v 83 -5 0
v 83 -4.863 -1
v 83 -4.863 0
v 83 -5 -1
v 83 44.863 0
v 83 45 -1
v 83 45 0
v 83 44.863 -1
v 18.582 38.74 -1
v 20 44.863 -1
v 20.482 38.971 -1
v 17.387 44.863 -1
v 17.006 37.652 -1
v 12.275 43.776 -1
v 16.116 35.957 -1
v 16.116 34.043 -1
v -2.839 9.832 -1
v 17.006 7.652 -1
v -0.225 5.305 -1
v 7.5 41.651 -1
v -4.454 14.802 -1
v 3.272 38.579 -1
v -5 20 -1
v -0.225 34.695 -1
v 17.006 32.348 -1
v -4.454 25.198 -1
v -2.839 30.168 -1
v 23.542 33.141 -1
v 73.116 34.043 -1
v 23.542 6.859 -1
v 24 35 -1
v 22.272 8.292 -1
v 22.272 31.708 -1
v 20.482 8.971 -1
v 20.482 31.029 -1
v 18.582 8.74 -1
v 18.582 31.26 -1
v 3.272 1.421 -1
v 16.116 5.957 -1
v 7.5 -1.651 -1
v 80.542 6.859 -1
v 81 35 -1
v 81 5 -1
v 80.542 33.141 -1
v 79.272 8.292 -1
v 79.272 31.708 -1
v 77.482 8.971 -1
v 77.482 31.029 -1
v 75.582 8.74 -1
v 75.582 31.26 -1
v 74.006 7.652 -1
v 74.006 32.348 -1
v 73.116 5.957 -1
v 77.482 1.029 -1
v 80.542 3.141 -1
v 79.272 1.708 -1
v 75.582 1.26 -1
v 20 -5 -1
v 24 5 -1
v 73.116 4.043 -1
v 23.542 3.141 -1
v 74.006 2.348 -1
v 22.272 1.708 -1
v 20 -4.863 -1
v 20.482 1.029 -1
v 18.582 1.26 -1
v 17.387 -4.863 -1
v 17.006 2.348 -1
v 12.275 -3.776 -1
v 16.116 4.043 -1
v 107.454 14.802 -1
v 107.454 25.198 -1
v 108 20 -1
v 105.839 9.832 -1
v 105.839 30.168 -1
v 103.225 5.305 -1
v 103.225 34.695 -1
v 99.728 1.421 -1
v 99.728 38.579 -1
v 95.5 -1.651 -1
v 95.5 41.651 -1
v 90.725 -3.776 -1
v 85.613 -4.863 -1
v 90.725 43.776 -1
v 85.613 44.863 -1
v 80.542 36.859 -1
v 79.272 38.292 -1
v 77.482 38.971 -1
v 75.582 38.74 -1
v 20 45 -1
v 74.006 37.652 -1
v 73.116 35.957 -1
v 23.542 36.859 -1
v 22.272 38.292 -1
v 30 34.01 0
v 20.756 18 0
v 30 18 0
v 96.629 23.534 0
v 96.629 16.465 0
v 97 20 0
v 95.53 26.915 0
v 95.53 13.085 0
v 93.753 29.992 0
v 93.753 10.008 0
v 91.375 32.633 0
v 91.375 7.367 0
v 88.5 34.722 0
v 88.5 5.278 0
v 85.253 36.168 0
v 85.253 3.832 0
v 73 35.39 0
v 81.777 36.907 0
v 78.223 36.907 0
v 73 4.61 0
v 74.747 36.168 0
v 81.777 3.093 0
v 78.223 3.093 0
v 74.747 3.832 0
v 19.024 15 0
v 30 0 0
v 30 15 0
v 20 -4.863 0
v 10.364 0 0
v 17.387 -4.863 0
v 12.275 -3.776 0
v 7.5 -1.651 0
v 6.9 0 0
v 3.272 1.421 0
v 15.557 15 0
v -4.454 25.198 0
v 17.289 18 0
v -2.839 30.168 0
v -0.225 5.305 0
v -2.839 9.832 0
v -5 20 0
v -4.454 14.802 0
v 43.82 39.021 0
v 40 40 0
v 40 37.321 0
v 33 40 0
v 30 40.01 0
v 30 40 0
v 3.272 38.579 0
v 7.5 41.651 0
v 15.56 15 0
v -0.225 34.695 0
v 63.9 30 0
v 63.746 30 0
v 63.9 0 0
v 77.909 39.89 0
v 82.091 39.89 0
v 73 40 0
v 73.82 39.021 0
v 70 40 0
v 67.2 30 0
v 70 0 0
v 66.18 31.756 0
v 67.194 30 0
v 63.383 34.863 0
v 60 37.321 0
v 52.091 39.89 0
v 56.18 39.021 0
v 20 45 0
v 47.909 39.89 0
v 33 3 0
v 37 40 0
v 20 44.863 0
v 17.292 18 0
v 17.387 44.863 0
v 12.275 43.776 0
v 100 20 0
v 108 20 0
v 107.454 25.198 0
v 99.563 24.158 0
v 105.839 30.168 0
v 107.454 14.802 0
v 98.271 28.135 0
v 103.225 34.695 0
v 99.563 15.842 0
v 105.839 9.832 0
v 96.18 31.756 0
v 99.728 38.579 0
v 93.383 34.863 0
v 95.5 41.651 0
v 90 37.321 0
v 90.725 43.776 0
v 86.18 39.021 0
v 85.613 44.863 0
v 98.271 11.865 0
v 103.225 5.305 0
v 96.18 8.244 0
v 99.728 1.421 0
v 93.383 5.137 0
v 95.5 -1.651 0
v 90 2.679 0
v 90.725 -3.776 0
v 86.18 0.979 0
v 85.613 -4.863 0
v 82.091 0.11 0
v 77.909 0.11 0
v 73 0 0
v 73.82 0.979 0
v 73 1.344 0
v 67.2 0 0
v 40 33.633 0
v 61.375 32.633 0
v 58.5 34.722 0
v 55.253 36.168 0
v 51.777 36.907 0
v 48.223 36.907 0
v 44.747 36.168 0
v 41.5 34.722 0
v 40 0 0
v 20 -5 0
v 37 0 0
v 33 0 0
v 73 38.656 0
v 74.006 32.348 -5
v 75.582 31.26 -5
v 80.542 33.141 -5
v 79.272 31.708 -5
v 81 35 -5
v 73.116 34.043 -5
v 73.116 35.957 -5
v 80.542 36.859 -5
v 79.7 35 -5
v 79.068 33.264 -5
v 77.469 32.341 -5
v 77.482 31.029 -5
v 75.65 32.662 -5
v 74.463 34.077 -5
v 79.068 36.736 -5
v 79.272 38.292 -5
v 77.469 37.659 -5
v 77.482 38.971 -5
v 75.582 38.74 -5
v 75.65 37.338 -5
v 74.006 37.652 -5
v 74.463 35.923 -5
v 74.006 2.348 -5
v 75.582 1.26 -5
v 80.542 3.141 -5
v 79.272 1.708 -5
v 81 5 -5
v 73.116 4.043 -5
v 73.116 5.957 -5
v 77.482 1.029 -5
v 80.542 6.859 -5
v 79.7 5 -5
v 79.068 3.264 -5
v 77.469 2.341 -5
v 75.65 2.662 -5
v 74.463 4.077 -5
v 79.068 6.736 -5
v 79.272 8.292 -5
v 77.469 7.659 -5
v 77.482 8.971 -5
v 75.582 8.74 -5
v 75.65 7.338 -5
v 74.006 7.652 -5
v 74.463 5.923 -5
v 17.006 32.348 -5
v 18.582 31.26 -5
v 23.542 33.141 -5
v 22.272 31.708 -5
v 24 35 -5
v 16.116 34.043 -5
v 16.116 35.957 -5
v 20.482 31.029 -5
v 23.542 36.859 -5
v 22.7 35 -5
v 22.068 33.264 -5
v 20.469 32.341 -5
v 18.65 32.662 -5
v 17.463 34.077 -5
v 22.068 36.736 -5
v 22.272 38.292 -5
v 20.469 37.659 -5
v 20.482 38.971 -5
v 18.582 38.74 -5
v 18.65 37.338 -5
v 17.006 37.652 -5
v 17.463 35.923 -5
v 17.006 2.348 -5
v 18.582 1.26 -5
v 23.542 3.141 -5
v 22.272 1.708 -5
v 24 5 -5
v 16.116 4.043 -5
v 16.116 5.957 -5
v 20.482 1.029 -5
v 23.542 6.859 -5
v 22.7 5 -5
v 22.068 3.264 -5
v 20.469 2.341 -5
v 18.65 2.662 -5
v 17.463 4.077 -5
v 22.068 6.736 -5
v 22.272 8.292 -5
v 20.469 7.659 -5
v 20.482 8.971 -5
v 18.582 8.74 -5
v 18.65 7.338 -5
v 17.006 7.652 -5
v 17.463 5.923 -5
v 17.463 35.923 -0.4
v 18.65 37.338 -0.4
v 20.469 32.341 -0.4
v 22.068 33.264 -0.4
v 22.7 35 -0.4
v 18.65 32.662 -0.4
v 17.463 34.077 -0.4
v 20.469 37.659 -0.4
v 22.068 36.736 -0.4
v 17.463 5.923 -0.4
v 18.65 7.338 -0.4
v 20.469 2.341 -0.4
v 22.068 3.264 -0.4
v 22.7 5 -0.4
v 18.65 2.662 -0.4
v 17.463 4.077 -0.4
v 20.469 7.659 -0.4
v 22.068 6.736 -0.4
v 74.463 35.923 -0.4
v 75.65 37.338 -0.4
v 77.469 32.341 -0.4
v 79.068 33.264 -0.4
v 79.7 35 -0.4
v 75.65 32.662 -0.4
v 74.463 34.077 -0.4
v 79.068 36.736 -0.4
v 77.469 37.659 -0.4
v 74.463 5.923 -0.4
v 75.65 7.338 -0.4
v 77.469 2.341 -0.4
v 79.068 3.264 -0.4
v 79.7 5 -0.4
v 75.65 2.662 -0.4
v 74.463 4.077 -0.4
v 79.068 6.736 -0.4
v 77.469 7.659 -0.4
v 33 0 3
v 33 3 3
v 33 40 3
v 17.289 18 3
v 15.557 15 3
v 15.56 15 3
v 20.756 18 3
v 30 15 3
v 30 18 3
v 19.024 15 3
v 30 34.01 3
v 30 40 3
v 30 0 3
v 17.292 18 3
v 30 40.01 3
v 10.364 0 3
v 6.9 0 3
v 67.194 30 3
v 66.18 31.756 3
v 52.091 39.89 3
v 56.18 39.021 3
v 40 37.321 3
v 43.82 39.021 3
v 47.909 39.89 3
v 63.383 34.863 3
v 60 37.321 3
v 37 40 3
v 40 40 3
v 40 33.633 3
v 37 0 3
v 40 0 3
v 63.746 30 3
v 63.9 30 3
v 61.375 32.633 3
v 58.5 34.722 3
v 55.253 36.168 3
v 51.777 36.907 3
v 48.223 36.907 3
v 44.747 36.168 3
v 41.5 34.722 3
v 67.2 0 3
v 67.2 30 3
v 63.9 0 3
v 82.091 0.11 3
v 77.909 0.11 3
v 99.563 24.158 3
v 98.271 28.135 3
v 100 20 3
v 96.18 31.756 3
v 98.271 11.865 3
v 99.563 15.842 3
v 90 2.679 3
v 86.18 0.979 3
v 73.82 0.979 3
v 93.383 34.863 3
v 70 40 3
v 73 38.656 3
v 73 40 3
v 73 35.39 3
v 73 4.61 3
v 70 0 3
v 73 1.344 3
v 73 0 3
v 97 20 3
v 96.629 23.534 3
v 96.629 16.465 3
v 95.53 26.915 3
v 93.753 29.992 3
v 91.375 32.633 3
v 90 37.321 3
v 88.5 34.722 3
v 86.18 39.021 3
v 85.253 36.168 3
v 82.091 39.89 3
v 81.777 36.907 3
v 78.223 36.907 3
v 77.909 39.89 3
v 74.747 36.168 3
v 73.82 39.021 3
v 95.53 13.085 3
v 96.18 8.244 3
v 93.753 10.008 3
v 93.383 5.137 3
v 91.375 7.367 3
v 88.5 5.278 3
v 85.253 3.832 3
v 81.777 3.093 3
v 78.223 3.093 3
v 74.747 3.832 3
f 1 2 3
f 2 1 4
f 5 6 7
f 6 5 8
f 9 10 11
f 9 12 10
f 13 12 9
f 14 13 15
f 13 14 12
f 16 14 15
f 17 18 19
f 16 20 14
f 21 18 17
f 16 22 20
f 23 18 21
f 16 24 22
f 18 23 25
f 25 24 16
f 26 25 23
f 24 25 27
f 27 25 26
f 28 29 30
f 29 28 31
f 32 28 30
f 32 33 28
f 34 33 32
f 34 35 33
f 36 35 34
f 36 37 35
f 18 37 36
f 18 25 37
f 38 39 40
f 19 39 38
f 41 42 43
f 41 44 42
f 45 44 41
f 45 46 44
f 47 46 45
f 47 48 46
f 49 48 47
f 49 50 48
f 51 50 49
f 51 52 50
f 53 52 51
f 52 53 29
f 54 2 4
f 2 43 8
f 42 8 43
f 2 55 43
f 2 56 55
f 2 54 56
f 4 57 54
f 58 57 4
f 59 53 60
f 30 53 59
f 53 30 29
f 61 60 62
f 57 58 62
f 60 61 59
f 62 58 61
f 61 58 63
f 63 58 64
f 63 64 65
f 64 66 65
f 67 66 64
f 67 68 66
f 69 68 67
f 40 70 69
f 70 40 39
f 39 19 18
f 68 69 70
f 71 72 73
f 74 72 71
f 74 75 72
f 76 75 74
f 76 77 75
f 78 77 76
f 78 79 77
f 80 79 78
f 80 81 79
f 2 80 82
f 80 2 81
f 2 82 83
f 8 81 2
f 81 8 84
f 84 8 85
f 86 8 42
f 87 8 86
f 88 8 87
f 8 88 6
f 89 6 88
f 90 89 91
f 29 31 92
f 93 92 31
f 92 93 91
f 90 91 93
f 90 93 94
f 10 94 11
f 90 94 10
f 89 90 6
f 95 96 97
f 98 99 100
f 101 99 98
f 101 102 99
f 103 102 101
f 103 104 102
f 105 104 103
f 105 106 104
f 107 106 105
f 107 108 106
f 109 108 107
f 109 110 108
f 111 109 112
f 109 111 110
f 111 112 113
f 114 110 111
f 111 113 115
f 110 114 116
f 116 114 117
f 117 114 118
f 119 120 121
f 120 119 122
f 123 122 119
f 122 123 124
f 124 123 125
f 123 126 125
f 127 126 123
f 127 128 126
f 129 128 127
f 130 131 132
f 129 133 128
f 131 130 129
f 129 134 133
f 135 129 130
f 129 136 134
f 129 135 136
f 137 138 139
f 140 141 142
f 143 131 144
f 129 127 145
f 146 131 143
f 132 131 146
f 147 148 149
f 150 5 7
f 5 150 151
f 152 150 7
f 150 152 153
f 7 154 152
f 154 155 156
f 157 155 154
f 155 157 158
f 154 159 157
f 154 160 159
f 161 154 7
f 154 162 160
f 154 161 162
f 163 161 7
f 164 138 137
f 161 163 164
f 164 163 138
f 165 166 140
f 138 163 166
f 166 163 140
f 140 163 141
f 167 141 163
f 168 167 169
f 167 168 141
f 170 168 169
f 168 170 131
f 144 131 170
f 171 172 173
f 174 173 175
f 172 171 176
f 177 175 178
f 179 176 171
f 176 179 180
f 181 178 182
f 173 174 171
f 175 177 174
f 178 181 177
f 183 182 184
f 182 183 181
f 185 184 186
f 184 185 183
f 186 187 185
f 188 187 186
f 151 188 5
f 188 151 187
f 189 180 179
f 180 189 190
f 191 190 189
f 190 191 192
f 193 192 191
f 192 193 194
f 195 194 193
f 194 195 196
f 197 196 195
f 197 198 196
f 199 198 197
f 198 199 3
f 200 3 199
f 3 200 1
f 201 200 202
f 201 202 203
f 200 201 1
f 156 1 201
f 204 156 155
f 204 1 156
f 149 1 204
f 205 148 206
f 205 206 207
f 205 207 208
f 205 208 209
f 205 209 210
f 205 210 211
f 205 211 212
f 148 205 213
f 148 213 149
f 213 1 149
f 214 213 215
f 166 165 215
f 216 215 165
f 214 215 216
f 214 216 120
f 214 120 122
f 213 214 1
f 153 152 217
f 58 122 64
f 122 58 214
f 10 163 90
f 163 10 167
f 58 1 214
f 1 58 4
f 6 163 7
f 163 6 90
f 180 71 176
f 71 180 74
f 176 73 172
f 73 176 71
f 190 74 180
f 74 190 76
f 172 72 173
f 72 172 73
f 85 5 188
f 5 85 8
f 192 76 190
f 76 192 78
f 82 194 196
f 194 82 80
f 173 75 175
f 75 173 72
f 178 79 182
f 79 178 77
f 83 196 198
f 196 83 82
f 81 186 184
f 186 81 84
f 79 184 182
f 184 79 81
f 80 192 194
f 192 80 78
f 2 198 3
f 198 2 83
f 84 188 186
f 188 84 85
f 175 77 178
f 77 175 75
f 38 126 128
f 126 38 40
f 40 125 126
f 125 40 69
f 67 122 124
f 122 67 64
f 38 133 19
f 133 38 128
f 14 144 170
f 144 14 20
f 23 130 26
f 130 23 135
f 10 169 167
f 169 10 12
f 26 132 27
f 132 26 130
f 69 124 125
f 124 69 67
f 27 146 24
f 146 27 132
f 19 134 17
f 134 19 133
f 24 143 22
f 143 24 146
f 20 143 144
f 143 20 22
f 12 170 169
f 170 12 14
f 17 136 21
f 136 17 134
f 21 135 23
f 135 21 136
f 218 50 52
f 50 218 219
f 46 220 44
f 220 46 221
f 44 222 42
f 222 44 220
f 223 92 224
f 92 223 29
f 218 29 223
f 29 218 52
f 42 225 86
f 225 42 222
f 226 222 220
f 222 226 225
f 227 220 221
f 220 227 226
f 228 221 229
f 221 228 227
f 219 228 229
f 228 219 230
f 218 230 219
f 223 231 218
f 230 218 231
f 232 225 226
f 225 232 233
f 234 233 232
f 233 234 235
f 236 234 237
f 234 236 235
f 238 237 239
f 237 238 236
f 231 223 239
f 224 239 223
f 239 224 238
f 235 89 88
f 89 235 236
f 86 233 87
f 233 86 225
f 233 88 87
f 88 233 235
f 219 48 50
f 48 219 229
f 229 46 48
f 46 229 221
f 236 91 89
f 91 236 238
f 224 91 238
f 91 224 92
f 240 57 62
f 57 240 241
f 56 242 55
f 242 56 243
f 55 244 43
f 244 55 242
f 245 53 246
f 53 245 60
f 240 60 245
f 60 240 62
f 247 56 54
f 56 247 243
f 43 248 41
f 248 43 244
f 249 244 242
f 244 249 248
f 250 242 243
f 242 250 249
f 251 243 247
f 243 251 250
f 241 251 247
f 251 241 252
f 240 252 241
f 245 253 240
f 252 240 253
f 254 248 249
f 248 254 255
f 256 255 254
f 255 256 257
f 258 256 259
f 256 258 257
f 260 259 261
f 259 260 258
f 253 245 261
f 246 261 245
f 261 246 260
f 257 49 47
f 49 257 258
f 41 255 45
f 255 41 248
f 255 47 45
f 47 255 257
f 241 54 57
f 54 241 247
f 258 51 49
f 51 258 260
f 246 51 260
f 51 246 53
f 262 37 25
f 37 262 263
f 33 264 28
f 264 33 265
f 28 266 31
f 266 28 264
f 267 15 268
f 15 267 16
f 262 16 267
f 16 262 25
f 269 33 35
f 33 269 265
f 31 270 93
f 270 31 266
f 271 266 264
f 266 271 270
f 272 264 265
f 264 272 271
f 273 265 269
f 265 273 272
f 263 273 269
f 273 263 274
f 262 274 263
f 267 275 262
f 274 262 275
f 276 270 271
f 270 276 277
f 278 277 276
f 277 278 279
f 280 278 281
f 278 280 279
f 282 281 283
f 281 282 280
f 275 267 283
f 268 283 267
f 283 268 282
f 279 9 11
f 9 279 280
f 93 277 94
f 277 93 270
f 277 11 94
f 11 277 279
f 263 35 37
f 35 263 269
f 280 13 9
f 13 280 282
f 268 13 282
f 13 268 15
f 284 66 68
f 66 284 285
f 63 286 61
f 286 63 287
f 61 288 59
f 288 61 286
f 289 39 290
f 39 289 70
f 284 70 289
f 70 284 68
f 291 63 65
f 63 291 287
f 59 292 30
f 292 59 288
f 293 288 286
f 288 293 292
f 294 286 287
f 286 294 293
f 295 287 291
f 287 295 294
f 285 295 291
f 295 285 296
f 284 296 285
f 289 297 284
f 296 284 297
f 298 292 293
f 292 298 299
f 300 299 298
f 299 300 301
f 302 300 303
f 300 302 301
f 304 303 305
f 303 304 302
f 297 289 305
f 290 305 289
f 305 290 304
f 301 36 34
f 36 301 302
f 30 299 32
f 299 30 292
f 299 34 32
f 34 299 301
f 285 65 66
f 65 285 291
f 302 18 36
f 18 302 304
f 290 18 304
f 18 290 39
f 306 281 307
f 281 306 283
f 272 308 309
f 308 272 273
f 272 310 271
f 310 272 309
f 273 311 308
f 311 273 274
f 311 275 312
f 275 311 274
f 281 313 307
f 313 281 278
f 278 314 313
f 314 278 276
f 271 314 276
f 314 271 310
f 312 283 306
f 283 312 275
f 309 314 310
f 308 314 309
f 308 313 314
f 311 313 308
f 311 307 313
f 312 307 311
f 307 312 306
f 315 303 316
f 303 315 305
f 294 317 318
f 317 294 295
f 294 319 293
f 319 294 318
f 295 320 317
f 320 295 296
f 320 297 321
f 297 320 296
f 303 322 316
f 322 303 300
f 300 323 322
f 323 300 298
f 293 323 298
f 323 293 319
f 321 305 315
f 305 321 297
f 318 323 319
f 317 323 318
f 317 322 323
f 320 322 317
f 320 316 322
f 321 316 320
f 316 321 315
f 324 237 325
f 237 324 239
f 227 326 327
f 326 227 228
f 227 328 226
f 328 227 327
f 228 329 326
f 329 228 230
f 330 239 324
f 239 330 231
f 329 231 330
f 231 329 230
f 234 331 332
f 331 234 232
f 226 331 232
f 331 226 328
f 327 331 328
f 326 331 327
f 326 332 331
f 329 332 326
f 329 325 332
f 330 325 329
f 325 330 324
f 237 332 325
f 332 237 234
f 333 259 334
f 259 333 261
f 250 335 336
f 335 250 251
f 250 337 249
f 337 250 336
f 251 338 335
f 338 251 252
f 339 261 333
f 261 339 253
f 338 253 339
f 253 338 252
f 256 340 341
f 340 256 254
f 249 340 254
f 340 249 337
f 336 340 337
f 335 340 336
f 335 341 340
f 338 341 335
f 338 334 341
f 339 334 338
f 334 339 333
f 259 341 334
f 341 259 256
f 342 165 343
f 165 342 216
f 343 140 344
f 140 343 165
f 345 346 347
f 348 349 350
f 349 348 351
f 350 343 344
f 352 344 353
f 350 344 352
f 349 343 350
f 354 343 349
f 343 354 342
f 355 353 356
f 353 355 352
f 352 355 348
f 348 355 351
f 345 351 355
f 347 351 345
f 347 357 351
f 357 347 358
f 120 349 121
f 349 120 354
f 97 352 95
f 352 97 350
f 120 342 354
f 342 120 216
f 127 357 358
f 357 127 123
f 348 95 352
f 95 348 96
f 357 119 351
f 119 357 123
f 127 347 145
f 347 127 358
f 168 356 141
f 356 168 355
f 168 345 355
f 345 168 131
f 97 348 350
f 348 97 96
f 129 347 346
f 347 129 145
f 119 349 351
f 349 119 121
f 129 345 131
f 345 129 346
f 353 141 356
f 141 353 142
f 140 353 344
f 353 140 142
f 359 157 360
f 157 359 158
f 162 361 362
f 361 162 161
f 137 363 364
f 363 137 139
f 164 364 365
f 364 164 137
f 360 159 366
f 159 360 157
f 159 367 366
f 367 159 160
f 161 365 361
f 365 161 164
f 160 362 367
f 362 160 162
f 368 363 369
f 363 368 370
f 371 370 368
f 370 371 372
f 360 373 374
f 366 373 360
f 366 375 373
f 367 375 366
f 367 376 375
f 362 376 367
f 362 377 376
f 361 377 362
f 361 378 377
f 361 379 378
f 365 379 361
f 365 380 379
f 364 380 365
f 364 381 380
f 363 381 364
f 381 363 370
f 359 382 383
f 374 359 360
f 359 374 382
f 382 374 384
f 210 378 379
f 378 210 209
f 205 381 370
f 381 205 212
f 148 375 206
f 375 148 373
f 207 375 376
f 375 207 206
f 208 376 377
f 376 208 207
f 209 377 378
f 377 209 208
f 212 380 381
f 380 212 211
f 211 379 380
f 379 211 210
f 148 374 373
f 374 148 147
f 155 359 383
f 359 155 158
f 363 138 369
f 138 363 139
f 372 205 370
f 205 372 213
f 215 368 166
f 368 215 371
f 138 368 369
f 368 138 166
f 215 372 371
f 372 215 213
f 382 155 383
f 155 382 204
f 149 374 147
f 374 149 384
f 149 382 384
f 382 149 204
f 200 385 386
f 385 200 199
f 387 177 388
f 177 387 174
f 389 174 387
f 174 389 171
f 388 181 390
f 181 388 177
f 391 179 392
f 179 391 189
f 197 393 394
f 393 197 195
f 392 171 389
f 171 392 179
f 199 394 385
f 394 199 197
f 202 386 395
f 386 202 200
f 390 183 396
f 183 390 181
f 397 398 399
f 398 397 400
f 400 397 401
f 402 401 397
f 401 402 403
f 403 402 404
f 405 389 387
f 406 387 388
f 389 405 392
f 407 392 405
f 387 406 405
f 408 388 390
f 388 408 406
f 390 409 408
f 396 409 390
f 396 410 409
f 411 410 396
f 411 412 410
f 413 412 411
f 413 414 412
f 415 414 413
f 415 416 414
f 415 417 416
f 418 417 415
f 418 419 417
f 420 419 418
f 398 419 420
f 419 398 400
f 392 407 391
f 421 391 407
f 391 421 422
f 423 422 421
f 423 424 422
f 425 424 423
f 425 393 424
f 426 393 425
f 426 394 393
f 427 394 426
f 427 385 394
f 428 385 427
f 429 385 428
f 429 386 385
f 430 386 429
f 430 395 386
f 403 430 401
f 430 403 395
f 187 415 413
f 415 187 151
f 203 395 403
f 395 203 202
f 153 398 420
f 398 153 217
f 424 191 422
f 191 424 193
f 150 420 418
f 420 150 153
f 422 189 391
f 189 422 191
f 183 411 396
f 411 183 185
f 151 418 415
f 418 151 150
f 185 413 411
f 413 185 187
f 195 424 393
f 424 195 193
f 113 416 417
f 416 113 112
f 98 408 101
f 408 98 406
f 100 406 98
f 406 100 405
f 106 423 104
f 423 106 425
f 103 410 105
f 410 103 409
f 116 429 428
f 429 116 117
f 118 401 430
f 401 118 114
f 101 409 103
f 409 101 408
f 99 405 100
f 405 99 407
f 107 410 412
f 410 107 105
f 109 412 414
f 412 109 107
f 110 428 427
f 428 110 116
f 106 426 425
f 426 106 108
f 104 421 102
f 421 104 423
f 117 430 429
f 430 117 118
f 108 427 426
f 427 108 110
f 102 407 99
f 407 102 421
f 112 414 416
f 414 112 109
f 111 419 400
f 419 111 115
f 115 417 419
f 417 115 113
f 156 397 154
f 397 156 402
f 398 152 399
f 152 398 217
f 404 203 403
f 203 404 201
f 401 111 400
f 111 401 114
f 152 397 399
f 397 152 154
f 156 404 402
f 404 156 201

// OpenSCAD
union(){
 rotate([0,900,180]) translate([20,-45,0])
difference(){  
 union(){  
  cube([63,50,1]);
   translate([63,25,0]) cylinder(1,25,25);
    translate([0,25,0]) cylinder(1,25,25);
  
  translate([57,10,0]) cylinder(5,4,4);
  translate([57,40,0]) cylinder(5,4,4);
  translate([0,10,0]) cylinder(5,4,4);
  translate([0,40,0]) cylinder(5,4,4);
}
  

  #translate([0,10,0.4]) cylinder(5,2.7,2.7);
  #translate([0,40,0.4]) cylinder(5,2.7,2.7);
  




  #translate([57,10,0.4]) cylinder(5,2.7,2.7);
  #translate([57,40,0.4]) cylinder(5,2.7,2.7);

  }


}

//буква a
translate([30,0,0])
union(){
    difference(){
union(){
 cube([3,40,3]);
 translate([-23.1,0,0]) rotate([0,0,-30])  cube([3,50,3]);
 translate([-15,15,0]) cube([20,3,3]);
}
 translate([-40,-8,-1]) cube([60,8,5]);
 translate([3,3,-1]) cube([10,40,5]);
 translate([-34.65,0,-1]) rotate([0,0,-30]) cube([10,40,5]);
 translate([0,40,-1]) cube(10);
}
}  


//буква n
translate([20,0,0]){
union(){
translate([17,0,0]) cube([3,40,3]);
difference(){
translate([30,20,0]) cylinder(3,20,20);
translate([30,20,0]) cylinder(5,17,17);
translate([10,0,0]) cube([40,30,4]);
translate([10,0,0]) cube([10,40,4]);
}
translate([43.9,0,0]) cube([3.3,30,3]);
}
}
//буква d
translate([75,0,0])
union(){
 translate([-5,0,0]) cube([3,40,3]);
difference(){
 translate([5,20,0]) cylinder(3,20,20);
 translate([5,20,-1]) cylinder(5,17,17);
 translate([-15,0,-1]) cube([10,40,5]);
}

}
